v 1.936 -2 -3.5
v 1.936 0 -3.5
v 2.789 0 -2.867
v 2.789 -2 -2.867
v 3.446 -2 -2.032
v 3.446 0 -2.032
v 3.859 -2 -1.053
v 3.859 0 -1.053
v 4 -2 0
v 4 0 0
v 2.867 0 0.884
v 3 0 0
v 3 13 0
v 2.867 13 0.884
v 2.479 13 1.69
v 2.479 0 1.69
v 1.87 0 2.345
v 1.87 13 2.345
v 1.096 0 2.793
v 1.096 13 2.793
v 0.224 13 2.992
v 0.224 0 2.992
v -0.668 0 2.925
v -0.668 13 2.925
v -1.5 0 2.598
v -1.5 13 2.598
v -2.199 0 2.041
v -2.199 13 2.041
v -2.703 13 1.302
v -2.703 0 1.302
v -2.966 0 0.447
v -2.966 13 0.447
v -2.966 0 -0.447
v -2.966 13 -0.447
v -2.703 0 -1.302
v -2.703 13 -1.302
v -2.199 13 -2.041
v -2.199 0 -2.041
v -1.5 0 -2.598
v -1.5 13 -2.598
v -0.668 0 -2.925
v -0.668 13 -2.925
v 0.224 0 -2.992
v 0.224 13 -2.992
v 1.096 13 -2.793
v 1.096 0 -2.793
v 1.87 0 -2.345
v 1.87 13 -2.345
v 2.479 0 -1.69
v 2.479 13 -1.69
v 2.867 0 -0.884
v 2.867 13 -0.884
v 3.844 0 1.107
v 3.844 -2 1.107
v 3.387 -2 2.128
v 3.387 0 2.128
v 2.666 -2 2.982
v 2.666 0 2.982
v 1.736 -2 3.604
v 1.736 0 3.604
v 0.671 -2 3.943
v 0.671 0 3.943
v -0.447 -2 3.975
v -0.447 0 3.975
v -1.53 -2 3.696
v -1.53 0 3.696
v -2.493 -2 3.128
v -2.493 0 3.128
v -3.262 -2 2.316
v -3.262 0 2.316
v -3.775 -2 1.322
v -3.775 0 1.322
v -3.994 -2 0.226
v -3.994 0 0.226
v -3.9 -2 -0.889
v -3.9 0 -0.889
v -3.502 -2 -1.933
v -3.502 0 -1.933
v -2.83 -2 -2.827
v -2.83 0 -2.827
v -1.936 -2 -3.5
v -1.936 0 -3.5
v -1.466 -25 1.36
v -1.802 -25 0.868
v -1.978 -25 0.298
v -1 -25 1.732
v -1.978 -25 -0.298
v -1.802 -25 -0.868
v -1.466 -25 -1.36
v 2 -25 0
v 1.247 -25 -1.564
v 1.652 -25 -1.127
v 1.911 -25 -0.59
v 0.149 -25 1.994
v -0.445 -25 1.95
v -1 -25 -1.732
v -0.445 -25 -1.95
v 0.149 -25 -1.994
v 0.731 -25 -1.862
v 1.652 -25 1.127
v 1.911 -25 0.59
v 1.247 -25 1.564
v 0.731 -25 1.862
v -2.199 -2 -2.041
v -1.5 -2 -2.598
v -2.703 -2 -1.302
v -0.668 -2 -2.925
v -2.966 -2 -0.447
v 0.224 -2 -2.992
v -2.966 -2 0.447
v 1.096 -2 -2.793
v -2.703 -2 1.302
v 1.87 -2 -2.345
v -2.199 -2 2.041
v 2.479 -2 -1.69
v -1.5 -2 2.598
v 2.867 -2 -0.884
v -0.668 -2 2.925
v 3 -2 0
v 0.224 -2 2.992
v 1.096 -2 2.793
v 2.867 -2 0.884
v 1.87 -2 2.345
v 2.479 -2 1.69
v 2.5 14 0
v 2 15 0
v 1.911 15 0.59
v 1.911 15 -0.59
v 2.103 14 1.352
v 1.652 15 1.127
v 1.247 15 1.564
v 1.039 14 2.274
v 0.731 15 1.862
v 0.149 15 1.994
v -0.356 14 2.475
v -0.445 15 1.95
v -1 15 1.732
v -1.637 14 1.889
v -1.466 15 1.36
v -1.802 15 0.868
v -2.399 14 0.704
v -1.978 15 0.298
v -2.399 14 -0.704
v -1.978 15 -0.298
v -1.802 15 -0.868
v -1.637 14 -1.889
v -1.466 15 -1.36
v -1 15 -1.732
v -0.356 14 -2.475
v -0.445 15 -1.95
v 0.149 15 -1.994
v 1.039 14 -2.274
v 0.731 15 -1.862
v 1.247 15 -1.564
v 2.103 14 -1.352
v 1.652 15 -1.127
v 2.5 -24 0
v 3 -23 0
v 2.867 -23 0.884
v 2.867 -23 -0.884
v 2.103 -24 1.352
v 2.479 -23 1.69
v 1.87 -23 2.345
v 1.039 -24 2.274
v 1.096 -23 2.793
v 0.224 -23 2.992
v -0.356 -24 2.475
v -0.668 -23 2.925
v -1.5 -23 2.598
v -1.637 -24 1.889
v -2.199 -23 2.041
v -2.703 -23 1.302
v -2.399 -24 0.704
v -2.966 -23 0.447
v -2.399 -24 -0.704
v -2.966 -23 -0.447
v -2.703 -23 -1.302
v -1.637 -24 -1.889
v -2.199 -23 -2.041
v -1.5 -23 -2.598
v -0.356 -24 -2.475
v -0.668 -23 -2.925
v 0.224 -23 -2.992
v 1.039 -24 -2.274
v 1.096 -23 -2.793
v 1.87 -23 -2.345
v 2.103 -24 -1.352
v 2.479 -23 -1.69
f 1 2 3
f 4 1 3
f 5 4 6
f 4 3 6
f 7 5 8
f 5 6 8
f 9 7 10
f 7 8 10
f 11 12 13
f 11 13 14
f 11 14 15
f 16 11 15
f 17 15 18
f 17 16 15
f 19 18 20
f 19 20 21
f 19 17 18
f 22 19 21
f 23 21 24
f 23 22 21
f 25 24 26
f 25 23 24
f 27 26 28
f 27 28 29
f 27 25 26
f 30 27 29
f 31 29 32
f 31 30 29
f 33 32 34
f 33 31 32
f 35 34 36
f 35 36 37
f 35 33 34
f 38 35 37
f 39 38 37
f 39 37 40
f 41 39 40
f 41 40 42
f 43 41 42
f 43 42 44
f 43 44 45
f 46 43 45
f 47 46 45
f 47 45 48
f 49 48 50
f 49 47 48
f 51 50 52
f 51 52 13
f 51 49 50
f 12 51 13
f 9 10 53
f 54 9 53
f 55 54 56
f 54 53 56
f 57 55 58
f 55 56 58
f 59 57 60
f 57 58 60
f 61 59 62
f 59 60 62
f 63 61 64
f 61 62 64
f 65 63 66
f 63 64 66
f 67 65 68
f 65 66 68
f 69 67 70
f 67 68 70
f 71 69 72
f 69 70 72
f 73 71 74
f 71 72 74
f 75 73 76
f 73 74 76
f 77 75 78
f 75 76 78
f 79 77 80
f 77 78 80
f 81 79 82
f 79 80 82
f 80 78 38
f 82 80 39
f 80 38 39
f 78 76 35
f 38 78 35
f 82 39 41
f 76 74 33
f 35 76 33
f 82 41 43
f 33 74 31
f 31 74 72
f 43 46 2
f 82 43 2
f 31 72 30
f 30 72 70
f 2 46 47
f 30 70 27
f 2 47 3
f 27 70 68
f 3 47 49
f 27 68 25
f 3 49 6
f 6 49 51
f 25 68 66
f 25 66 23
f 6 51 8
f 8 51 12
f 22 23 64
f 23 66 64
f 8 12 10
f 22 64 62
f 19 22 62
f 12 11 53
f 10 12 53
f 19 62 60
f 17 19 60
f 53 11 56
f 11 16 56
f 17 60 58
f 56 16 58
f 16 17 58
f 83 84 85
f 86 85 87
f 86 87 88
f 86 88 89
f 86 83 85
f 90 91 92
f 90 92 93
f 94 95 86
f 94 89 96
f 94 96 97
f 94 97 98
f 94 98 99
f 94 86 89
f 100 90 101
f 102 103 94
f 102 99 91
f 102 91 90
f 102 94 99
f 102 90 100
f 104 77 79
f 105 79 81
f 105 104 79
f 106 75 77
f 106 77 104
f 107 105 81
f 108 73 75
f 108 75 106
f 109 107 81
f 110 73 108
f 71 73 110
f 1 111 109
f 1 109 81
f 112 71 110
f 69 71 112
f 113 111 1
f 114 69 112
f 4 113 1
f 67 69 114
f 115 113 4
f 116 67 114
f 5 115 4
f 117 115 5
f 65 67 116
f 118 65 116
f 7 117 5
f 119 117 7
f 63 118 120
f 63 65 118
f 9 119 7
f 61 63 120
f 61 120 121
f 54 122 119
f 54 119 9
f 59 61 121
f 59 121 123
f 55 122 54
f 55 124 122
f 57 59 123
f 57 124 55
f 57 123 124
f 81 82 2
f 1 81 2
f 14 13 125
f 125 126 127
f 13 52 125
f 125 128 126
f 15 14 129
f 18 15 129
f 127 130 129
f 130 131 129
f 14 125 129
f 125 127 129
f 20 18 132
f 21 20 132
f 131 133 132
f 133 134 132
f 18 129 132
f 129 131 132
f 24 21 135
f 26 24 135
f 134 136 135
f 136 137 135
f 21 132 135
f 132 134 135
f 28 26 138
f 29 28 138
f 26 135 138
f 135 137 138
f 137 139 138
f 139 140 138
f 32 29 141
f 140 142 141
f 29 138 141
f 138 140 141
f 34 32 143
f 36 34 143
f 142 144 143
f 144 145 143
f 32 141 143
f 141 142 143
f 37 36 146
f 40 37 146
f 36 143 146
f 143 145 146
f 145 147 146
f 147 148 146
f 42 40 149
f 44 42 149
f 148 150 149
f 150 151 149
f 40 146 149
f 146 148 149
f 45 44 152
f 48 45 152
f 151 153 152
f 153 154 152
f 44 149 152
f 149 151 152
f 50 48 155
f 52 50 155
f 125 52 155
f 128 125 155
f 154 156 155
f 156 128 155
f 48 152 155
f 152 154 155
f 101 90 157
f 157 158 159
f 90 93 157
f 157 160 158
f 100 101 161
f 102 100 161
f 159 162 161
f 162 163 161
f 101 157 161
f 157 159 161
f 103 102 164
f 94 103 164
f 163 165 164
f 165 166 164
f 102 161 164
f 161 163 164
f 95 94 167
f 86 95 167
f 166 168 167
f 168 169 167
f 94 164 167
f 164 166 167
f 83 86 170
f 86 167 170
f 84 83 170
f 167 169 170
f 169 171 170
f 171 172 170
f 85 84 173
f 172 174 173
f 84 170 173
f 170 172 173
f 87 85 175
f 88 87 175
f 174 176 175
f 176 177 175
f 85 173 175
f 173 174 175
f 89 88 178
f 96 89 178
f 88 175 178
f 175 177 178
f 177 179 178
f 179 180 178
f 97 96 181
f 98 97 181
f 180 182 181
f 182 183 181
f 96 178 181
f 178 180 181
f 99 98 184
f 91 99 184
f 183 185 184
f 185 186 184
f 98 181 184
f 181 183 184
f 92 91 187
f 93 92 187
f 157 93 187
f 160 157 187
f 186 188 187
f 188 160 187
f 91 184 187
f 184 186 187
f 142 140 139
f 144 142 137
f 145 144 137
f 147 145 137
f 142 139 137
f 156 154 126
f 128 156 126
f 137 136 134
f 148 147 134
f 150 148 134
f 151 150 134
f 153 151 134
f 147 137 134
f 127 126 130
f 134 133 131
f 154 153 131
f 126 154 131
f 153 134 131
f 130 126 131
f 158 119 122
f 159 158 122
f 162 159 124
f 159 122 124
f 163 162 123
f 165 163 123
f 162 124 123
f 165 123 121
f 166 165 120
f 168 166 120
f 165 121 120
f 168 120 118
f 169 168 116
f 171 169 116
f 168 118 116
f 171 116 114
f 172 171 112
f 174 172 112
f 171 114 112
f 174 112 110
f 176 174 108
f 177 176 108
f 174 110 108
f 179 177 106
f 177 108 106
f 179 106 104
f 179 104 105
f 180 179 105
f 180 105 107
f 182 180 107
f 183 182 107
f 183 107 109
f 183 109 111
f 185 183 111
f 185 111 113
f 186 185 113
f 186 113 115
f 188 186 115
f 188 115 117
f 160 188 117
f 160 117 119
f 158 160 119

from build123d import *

# Parameters (mm, degrees)
F0_R     = 3
F1_DEPTH = 25
F2_DEPTH = 2
F3_DEPTH = 15
F4_SIZE2 = 1
F4_SIZE  = 2
F5_SIZE2 = 2
F5_SIZE  = 1


with BuildPart() as f1:
    # F0 (on Front) → F1 (new body)
    with BuildSketch(Plane.XZ):
        Circle(F0_R)
    extrude(amount=F1_DEPTH)

    # F0 (on Front) → F2 (join)
    with BuildSketch(Plane.XZ):
        with BuildLine():
            ThreePointArc((1.9364916731, -3.5), (3.4457195687, -2.0315060063), (4, 0))
            ThreePointArc((4, 0), (-2.0315060063, 3.4457195687), (-1.9364916731, -3.5))
            Line((-1.9364916731, -3.5), (1.9364916731, -3.5))
        make_face()
        Circle(F0_R, mode=Mode.SUBTRACT)
    extrude(amount=F2_DEPTH)

    # F0 (on Front) → F3 (join)
    with BuildSketch(Plane.XZ):
        Circle(F0_R)
    extrude(amount=-F3_DEPTH)

    # F4
    f4_edges = [f1.edges().sort_by_distance(p)[0] for p in [
        (-3, 15, 0),
    ]]
    f4_side = f1.faces().sort_by_distance((-3, 7.5, 0))[0]
    chamfer(f4_edges, length=F4_SIZE, length2=F4_SIZE2, reference=f4_side)

    # F5
    f5_edges = [f1.edges().sort_by_distance(p)[0] for p in [
        (-3, -25, 0),
    ]]
    f5_side = f1.faces().sort_by_distance((0, -25, 0))[0]
    chamfer(f5_edges, length=F5_SIZE, length2=F5_SIZE2, reference=f5_side)


solid = f1.part
